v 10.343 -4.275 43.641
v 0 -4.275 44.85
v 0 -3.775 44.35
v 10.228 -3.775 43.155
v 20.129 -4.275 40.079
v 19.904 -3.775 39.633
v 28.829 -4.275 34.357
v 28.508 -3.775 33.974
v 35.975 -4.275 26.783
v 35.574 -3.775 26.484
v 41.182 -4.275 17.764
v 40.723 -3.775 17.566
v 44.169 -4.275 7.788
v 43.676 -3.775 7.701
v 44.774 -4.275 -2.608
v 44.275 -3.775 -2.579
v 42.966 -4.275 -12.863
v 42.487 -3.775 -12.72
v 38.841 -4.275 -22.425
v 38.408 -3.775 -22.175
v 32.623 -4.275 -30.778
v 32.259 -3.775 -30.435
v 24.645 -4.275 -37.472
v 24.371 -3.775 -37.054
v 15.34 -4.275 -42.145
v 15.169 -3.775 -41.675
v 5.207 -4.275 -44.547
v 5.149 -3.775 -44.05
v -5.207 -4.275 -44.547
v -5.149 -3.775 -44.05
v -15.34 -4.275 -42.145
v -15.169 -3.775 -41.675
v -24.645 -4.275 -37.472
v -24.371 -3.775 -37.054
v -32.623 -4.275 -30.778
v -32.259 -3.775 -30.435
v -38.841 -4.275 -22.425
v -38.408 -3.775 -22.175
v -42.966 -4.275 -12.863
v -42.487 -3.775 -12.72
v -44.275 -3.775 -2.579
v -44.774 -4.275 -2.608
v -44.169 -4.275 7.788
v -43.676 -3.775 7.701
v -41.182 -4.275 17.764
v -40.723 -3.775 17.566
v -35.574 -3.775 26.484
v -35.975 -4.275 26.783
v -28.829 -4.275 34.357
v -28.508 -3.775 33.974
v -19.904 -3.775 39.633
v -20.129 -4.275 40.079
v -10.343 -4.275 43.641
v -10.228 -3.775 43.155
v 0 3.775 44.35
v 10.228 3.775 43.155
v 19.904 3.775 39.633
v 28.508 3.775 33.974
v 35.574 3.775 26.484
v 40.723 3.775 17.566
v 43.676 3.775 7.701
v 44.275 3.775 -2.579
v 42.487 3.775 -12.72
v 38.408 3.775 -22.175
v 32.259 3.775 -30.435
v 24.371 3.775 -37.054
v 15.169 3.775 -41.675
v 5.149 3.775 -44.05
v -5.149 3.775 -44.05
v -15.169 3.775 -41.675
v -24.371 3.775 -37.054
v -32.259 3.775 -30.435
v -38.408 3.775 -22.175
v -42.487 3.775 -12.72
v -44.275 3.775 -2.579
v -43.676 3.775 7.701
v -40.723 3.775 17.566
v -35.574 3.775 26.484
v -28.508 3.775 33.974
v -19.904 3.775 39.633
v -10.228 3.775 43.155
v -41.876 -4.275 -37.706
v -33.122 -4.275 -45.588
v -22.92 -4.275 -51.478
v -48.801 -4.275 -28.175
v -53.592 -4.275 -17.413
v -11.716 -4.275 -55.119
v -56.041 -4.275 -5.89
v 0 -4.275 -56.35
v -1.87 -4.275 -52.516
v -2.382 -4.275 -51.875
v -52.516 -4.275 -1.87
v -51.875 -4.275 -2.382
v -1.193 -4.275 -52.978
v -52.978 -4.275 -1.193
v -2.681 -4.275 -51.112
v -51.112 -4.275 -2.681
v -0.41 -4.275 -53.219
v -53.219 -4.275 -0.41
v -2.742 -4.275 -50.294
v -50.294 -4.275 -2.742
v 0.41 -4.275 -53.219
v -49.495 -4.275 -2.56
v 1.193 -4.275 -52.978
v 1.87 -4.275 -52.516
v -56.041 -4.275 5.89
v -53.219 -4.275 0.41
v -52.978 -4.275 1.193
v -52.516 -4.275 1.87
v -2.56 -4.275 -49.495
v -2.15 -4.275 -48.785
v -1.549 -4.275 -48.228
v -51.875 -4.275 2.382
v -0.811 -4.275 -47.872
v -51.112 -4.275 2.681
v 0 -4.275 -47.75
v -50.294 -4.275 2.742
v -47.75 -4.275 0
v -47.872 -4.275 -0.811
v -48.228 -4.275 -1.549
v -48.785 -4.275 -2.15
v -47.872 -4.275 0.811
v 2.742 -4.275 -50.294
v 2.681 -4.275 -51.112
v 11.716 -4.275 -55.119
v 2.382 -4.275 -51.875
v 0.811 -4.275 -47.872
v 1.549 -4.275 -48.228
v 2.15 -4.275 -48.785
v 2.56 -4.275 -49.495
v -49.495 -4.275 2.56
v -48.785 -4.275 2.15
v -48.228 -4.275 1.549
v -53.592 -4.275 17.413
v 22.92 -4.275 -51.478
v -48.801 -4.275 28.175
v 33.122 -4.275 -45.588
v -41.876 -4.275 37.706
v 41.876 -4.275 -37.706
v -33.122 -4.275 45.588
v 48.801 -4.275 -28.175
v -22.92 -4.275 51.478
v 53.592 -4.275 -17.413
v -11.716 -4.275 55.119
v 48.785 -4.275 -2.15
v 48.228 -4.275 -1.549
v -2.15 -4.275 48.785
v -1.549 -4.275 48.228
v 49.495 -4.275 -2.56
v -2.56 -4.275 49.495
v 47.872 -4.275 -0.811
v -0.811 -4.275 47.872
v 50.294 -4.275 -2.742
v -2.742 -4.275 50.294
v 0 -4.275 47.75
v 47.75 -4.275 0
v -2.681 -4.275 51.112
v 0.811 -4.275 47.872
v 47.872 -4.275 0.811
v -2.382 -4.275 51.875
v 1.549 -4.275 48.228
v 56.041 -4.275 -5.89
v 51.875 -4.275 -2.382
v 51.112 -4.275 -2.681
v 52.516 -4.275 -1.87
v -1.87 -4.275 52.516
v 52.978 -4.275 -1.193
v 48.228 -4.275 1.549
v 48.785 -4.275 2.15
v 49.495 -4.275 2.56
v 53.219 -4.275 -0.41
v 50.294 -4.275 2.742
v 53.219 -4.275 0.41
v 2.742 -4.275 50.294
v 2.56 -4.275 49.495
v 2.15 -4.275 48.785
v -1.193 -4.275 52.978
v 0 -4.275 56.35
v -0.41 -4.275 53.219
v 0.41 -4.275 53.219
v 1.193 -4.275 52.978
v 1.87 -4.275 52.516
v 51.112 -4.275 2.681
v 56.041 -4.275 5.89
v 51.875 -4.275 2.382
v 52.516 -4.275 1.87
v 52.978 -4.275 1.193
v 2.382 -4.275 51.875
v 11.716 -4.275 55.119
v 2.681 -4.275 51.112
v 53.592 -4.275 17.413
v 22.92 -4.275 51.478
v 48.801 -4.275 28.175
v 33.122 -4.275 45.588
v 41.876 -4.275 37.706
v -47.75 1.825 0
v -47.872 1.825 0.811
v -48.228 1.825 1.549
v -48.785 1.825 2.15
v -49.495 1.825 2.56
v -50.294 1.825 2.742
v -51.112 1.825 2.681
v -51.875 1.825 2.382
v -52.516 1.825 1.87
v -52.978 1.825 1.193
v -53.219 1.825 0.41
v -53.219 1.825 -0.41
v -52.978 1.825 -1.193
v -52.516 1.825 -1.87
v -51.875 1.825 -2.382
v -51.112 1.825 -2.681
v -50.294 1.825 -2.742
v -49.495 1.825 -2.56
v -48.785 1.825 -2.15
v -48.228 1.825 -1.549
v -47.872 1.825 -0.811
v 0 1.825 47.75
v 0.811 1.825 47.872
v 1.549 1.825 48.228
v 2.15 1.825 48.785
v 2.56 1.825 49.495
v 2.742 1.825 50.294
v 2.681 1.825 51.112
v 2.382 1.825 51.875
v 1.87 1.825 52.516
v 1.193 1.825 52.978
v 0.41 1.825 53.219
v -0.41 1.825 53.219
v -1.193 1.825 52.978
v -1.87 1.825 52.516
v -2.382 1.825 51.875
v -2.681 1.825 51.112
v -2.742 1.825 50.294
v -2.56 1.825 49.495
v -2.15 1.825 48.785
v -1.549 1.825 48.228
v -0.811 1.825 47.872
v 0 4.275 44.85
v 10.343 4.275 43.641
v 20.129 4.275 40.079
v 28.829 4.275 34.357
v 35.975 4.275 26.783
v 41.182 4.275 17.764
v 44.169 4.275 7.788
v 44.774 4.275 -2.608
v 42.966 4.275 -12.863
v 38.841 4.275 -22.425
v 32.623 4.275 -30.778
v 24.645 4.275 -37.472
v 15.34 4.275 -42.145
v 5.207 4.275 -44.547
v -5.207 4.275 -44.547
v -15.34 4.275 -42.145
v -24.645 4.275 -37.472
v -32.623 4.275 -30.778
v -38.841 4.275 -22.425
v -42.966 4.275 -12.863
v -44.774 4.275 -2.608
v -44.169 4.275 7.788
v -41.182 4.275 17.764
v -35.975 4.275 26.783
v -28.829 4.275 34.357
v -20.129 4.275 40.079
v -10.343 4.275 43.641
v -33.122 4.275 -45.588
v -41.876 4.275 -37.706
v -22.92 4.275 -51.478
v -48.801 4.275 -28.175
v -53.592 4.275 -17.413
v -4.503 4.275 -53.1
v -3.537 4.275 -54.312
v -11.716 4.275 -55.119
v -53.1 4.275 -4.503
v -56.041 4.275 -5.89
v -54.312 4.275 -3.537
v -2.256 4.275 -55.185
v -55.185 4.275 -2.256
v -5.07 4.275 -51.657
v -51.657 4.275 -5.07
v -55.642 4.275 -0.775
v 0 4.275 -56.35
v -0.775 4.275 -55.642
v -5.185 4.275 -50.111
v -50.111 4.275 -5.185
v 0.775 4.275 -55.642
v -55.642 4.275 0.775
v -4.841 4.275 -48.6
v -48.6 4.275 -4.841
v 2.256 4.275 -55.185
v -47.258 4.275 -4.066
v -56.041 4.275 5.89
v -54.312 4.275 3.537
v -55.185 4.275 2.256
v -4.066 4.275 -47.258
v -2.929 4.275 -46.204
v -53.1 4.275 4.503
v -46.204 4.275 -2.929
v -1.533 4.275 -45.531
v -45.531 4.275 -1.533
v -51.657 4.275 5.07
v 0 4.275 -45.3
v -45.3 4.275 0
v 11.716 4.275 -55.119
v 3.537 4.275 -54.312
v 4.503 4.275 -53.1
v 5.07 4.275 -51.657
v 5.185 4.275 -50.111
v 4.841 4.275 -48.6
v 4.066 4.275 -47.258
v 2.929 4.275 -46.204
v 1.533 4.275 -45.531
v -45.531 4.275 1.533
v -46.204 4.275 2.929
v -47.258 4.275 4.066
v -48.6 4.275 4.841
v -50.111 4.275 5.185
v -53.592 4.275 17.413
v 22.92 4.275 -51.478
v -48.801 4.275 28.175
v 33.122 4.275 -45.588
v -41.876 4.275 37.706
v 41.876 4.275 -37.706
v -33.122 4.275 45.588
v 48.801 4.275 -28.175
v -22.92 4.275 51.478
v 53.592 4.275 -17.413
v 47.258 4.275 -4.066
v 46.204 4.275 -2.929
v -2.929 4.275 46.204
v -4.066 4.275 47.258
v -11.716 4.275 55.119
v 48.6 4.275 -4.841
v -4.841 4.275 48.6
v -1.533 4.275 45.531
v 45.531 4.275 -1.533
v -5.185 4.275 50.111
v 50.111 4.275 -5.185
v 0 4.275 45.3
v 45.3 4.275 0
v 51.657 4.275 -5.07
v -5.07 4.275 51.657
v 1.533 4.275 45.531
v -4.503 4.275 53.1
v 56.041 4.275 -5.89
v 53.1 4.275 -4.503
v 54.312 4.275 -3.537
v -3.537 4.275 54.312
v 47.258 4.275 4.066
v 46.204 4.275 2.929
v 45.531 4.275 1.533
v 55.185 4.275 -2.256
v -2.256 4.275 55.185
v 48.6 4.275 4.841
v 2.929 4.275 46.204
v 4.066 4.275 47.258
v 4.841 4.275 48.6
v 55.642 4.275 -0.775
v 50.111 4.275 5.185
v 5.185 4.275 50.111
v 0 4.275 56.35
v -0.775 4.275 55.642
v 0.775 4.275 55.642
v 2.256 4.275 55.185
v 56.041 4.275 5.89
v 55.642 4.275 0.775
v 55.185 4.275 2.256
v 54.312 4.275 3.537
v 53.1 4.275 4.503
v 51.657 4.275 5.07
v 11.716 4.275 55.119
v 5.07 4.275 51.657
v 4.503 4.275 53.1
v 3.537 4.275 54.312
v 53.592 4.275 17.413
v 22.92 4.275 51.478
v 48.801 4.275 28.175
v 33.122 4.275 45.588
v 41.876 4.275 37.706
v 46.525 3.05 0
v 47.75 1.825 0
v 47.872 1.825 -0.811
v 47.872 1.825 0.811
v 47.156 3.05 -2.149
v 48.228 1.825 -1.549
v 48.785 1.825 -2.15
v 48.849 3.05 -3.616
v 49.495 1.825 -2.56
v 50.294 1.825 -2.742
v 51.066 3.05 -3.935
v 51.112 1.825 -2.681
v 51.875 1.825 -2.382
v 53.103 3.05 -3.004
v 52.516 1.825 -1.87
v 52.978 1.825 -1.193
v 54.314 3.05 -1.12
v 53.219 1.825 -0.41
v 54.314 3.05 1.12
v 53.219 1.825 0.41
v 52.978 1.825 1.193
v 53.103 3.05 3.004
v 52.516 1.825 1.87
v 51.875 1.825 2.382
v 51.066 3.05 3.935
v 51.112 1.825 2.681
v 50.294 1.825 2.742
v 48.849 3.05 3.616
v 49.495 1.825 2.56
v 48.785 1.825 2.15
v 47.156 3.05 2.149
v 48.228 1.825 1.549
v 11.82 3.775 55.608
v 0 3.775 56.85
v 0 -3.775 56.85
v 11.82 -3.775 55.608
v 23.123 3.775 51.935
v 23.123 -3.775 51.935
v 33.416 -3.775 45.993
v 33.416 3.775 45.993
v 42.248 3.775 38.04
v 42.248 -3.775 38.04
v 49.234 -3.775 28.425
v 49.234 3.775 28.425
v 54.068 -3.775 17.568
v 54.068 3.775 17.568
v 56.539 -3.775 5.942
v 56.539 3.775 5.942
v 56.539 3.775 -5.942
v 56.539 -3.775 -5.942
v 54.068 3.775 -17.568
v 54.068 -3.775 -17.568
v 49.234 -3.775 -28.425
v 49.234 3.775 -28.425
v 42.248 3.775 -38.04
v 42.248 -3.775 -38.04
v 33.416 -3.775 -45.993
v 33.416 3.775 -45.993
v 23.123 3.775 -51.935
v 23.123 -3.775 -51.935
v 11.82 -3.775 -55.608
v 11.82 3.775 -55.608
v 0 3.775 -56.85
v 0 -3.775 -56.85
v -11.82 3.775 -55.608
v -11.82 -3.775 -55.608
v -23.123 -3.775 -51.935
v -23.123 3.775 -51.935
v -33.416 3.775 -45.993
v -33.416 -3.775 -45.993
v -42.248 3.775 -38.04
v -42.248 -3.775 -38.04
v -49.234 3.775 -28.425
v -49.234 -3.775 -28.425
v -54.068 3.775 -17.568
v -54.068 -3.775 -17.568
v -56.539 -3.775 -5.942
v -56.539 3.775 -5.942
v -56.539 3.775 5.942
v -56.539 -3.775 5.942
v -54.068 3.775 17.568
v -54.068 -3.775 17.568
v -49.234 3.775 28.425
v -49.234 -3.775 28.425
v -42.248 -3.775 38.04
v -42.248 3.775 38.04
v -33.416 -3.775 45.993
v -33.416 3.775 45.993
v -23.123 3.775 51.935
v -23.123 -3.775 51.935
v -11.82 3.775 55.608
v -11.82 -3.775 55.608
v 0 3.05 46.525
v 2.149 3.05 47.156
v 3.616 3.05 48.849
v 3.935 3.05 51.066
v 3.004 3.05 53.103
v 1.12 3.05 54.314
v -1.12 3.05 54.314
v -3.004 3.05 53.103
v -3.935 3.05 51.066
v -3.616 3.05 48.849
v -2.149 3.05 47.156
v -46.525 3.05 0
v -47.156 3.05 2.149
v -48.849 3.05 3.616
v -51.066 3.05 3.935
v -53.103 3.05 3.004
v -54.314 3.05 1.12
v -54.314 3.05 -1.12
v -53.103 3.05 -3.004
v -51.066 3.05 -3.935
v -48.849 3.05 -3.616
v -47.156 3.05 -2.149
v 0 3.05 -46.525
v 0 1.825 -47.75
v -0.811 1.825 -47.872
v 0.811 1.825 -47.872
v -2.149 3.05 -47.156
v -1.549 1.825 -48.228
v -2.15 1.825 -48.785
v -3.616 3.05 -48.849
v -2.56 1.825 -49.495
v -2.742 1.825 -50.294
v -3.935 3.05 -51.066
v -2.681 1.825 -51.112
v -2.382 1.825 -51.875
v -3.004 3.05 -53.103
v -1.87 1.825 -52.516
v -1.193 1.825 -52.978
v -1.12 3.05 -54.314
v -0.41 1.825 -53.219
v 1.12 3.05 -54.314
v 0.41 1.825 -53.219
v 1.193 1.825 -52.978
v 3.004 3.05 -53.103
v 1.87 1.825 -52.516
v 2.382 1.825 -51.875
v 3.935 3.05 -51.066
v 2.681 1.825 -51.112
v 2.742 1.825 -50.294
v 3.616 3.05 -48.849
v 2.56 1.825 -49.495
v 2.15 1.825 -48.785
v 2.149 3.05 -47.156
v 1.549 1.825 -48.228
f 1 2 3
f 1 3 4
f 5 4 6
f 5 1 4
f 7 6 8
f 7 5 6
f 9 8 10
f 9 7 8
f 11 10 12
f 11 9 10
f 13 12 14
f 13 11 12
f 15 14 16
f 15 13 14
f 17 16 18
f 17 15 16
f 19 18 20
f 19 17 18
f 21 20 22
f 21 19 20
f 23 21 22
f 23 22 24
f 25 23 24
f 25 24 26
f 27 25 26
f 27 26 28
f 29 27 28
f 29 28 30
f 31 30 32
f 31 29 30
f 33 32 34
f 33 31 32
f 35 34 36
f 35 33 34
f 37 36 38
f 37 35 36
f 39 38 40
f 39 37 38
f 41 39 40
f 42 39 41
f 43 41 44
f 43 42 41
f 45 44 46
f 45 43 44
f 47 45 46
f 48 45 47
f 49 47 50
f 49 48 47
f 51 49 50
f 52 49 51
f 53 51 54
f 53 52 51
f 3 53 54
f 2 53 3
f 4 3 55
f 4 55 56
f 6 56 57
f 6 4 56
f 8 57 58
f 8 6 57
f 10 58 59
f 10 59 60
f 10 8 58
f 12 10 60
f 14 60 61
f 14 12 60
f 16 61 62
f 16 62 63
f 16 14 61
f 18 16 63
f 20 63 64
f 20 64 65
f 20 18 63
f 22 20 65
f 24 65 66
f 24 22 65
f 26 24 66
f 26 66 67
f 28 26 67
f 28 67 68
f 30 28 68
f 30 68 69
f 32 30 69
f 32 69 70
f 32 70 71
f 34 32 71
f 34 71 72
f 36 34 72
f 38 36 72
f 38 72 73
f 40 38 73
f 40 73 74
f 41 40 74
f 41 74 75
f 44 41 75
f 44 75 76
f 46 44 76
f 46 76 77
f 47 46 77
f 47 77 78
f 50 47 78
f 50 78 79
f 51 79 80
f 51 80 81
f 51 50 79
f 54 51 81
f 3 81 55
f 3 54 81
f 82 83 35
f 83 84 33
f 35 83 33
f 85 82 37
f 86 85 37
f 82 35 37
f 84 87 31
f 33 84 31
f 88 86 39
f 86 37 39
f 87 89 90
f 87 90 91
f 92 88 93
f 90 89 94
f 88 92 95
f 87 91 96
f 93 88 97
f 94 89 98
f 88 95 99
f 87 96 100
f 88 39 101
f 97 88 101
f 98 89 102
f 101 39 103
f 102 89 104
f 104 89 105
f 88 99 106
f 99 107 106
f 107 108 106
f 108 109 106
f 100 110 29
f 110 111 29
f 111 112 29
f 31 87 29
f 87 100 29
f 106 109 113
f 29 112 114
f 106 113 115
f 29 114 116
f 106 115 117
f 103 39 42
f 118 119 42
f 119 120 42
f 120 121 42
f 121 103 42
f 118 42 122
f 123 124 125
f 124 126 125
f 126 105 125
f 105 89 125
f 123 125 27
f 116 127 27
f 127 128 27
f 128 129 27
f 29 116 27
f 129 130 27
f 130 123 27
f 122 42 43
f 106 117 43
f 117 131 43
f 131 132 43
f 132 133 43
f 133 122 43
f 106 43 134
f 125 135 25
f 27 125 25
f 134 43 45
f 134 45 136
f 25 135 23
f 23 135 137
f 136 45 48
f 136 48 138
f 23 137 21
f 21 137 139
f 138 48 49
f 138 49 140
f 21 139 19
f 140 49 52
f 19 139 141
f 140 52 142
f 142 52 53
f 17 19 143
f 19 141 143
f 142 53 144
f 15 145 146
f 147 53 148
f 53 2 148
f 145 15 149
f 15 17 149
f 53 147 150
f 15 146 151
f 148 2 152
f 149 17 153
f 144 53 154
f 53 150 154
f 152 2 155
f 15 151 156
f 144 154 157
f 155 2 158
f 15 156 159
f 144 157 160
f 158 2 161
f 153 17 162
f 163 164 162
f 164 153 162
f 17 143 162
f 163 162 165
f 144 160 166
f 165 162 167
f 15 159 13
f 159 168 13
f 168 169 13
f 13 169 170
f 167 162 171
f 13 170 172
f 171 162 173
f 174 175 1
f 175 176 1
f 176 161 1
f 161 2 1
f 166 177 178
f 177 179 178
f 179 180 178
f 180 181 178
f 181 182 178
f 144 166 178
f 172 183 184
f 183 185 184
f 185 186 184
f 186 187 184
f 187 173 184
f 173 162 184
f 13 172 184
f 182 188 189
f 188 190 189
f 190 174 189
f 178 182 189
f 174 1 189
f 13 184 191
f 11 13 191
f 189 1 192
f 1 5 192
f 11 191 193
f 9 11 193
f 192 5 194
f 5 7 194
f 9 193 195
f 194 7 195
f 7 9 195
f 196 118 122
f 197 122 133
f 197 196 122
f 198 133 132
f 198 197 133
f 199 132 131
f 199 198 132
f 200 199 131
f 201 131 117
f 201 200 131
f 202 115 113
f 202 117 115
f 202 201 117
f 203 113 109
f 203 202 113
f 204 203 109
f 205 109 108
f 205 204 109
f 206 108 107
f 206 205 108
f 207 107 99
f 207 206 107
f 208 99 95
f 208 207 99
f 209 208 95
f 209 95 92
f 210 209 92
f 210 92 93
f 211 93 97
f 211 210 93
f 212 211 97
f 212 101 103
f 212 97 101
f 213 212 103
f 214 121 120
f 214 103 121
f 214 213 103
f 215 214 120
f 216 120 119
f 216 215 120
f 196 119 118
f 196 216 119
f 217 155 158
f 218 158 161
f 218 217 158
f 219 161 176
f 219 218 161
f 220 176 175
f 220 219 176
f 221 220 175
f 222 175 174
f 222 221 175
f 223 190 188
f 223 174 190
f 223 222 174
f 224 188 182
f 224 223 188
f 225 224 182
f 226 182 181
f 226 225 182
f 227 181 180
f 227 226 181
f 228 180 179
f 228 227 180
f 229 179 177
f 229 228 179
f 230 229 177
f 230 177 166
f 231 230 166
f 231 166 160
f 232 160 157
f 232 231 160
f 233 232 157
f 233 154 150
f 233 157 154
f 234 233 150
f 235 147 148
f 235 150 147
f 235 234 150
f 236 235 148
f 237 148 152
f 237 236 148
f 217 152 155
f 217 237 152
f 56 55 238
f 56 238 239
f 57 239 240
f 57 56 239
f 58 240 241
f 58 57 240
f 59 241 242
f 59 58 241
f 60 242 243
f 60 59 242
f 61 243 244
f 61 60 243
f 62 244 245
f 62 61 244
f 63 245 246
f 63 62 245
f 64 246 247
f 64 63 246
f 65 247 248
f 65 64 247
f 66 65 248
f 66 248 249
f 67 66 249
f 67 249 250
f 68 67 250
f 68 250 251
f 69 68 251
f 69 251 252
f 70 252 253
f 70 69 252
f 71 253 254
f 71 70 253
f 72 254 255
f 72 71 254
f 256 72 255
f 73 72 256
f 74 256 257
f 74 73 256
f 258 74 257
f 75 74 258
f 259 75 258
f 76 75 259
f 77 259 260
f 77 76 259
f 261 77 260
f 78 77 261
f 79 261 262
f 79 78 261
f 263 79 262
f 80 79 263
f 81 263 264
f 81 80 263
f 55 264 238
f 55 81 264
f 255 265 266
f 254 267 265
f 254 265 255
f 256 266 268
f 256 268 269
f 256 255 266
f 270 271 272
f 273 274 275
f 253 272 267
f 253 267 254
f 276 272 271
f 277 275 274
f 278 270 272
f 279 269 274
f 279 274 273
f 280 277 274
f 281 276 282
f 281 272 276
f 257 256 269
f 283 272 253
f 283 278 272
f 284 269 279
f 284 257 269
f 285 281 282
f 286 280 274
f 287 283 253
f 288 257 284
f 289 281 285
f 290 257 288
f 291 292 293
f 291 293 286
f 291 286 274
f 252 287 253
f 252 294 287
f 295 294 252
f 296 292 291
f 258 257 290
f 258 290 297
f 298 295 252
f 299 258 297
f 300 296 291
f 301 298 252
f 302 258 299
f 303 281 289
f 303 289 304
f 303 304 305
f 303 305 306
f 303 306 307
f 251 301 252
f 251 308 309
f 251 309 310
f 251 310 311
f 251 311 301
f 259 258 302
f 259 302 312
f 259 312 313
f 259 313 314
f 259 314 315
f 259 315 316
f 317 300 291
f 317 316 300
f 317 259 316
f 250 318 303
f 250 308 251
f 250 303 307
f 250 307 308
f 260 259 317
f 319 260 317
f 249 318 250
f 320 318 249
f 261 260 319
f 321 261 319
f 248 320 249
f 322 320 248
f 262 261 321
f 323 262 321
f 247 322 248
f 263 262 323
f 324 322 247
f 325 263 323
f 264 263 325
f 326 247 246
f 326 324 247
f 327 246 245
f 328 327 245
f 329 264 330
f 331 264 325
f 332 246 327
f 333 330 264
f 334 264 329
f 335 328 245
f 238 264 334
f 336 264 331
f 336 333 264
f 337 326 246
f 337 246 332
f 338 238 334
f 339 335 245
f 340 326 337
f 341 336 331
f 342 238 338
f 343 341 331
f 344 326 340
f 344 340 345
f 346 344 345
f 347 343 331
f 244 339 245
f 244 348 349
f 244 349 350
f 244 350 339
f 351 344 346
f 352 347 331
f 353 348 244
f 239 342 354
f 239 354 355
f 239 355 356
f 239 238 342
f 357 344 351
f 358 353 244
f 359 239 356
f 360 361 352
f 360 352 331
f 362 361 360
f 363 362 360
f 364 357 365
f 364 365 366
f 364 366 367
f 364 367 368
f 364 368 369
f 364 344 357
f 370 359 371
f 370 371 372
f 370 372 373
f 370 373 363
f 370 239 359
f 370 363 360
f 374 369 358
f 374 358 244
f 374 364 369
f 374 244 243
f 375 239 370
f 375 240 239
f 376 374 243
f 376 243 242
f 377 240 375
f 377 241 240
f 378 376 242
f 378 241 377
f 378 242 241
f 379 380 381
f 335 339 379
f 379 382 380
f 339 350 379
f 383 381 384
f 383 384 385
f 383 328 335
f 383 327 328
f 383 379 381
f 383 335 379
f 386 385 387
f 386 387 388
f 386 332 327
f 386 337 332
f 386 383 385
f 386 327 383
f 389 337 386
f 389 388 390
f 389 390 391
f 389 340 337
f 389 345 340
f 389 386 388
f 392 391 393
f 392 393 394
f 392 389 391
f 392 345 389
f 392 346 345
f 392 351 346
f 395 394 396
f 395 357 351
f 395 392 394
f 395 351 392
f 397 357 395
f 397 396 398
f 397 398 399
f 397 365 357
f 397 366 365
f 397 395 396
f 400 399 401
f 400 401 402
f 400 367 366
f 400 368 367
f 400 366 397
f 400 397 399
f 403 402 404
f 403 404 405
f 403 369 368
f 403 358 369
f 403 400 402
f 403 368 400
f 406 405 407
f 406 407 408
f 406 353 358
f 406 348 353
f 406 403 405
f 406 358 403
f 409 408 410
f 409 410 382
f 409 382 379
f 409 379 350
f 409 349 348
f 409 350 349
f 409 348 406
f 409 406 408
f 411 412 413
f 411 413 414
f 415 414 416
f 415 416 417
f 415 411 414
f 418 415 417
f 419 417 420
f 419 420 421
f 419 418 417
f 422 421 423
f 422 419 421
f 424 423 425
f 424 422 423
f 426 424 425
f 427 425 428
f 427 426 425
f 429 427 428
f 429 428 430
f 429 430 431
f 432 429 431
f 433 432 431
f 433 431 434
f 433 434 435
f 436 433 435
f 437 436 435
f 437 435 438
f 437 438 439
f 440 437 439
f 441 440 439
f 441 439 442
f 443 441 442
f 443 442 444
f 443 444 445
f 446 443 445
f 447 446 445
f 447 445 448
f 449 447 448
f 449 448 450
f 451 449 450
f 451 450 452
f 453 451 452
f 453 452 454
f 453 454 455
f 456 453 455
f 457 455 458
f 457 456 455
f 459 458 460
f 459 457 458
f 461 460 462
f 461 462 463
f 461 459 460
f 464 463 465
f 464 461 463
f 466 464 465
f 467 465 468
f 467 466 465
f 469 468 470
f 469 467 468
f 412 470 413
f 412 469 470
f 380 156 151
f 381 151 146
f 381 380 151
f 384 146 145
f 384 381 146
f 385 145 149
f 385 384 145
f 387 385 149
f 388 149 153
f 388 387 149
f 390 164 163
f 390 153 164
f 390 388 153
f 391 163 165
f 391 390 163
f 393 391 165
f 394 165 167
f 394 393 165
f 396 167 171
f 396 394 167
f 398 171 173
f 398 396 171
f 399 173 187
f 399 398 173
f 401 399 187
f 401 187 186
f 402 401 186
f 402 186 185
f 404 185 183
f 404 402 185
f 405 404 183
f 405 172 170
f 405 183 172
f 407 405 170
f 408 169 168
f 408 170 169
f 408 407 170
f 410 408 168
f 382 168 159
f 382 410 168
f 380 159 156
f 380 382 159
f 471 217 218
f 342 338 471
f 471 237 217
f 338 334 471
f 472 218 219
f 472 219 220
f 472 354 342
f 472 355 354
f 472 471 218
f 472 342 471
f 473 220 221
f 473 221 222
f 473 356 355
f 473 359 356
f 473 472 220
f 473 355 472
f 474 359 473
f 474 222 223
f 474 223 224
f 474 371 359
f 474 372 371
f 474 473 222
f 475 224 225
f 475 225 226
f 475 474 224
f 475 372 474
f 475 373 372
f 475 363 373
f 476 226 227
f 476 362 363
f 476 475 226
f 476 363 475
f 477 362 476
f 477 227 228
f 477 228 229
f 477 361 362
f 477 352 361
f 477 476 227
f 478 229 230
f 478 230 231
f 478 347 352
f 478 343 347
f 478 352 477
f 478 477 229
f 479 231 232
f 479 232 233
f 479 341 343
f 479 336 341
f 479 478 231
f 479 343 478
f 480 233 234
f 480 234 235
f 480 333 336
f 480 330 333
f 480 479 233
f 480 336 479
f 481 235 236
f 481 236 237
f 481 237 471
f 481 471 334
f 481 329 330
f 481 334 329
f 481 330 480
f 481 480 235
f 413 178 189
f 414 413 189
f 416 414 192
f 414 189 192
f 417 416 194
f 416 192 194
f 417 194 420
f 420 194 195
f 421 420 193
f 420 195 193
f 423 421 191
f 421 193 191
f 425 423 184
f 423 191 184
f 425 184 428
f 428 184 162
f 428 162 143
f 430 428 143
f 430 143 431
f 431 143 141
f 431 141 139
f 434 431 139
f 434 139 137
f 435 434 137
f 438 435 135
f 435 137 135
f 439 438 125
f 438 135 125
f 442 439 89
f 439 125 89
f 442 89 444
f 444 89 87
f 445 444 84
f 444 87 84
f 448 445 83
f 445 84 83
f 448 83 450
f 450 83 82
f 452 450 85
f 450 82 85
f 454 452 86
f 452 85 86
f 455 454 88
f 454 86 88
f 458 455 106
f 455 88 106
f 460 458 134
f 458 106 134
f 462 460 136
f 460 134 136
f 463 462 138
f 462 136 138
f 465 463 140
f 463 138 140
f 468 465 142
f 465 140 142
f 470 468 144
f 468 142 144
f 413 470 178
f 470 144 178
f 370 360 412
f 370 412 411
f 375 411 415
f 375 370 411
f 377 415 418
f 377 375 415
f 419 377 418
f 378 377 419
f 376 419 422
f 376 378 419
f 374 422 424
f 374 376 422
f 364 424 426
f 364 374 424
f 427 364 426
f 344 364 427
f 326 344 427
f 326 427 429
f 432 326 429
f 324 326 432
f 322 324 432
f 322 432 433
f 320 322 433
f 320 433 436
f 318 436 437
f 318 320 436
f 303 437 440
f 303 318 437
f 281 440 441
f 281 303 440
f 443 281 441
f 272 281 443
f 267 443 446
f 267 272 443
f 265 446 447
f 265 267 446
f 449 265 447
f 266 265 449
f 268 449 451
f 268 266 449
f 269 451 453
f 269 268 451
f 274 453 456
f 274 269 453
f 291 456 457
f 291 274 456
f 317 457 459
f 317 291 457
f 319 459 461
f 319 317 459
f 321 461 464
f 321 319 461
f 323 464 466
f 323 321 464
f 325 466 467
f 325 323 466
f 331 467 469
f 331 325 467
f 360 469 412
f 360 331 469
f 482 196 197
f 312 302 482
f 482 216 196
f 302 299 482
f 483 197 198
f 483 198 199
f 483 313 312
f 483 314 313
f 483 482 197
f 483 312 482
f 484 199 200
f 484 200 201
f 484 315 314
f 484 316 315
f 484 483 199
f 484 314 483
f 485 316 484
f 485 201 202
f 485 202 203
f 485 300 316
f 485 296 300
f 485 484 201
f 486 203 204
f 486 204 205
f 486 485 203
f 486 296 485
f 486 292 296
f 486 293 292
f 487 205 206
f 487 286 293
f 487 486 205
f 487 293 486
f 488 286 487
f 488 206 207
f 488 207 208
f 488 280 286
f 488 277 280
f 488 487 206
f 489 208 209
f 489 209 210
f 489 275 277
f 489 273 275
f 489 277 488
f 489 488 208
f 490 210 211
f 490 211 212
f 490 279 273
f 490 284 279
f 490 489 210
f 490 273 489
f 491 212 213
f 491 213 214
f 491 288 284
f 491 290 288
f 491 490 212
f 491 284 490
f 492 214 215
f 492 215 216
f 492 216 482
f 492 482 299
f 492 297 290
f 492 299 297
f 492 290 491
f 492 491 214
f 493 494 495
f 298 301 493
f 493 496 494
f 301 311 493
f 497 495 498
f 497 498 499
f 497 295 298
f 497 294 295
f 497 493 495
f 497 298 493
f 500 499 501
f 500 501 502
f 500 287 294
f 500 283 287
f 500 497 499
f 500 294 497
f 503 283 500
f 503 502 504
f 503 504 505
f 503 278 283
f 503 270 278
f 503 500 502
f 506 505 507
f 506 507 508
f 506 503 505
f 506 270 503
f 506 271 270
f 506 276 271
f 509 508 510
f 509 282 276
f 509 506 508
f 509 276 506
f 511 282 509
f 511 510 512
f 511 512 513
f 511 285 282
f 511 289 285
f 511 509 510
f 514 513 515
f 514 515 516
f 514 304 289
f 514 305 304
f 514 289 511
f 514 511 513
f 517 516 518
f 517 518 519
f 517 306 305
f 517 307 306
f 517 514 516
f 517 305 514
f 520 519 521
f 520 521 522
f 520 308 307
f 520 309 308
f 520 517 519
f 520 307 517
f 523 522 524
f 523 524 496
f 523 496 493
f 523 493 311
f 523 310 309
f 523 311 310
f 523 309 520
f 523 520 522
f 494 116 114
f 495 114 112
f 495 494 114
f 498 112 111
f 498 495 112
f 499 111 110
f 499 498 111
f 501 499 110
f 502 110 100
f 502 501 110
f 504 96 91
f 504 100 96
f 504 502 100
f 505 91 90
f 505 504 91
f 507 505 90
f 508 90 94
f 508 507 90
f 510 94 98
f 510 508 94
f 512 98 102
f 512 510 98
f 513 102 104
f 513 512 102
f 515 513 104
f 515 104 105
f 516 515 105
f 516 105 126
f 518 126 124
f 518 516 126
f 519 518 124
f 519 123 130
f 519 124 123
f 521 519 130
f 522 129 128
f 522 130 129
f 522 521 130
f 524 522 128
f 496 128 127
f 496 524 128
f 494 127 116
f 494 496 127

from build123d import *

# Parameters (mm, degrees)
SKETCH_1_R               = 56.85
SKETCH_1_R_2             = 44.35
EXTRUDE_1_DEPTH          = 4.275
CHAMFER_1_SIZE           = 0.5
SKETCH_2_R               = 2.5
CUT_EXTRUDE_1_DEPTH      = 10
PATTERN_CIRCULAR_1_COUNT = 4


with BuildPart() as part:
    # ｽｹｯﾁ1 → ﾎﾞｽ - 押し出し1 (new, symmetric)
    with BuildSketch(Plane(origin=(0, 0, 0), x_dir=(1, 0, 0), z_dir=(0, 1, 0))):
        with Locations(Location((0, 0, 0), (0, 0, 270))):
            Circle(SKETCH_1_R)
        with Locations(Location((0, 0, 0), (0, 0, 270))):
            Circle(SKETCH_1_R_2, mode=Mode.SUBTRACT)
    extrude(amount=EXTRUDE_1_DEPTH, both=True)

    # 面取り1
    chamfer_1_edges = [part.edges().sort_by_distance(p)[0] for p in [
        (0, -4.275, -56.85),
        (0, 4.275, -56.85),
        (0, -4.275, -44.35),
        (0, 4.275, -44.35),
    ]]
    chamfer(chamfer_1_edges, length=CHAMFER_1_SIZE)

    # ｽｹｯﾁ2 → ｶｯﾄ - 押し出し1 (cut)
    with BuildSketch(Plane(origin=(0, 4.275, 0), x_dir=(1, 0, 0), z_dir=(0, 1, 0))):
        with Locations(Location((0, 50.5, 0), (0, 0, 270))):
            Circle(SKETCH_2_R)
    extrude(amount=-CUT_EXTRUDE_1_DEPTH, mode=Mode.SUBTRACT)

    # ｽｹｯﾁ3 → M5 丸皿ねじ用皿穴1 (revolve, cut)
    with BuildSketch(Plane(origin=(0, 4.275, -50.5), x_dir=(0, 0, 1), z_dir=(1, 0, 0))):
        Polygon((0, 0), (0, 11.652366702), (2.75, 10), (2.75, 2.45), (5.2, 0), align=None)
    hole_wizard_m5_1 = revolve(axis=Axis((0, 10.625, -50.5), (0, -1, 0)), mode=Mode.SUBTRACT)

    # 円形ﾊﾟﾀｰﾝ1: M5 丸皿ねじ用皿穴1 ×4 about axis
    pattern_circular_1_axis = Axis((0, 0, 0), (0, 1, 0))
    for i in range(1, PATTERN_CIRCULAR_1_COUNT):
        add(hole_wizard_m5_1.rotate(pattern_circular_1_axis, i * 360 / PATTERN_CIRCULAR_1_COUNT), mode=Mode.SUBTRACT)


solid = part.part
